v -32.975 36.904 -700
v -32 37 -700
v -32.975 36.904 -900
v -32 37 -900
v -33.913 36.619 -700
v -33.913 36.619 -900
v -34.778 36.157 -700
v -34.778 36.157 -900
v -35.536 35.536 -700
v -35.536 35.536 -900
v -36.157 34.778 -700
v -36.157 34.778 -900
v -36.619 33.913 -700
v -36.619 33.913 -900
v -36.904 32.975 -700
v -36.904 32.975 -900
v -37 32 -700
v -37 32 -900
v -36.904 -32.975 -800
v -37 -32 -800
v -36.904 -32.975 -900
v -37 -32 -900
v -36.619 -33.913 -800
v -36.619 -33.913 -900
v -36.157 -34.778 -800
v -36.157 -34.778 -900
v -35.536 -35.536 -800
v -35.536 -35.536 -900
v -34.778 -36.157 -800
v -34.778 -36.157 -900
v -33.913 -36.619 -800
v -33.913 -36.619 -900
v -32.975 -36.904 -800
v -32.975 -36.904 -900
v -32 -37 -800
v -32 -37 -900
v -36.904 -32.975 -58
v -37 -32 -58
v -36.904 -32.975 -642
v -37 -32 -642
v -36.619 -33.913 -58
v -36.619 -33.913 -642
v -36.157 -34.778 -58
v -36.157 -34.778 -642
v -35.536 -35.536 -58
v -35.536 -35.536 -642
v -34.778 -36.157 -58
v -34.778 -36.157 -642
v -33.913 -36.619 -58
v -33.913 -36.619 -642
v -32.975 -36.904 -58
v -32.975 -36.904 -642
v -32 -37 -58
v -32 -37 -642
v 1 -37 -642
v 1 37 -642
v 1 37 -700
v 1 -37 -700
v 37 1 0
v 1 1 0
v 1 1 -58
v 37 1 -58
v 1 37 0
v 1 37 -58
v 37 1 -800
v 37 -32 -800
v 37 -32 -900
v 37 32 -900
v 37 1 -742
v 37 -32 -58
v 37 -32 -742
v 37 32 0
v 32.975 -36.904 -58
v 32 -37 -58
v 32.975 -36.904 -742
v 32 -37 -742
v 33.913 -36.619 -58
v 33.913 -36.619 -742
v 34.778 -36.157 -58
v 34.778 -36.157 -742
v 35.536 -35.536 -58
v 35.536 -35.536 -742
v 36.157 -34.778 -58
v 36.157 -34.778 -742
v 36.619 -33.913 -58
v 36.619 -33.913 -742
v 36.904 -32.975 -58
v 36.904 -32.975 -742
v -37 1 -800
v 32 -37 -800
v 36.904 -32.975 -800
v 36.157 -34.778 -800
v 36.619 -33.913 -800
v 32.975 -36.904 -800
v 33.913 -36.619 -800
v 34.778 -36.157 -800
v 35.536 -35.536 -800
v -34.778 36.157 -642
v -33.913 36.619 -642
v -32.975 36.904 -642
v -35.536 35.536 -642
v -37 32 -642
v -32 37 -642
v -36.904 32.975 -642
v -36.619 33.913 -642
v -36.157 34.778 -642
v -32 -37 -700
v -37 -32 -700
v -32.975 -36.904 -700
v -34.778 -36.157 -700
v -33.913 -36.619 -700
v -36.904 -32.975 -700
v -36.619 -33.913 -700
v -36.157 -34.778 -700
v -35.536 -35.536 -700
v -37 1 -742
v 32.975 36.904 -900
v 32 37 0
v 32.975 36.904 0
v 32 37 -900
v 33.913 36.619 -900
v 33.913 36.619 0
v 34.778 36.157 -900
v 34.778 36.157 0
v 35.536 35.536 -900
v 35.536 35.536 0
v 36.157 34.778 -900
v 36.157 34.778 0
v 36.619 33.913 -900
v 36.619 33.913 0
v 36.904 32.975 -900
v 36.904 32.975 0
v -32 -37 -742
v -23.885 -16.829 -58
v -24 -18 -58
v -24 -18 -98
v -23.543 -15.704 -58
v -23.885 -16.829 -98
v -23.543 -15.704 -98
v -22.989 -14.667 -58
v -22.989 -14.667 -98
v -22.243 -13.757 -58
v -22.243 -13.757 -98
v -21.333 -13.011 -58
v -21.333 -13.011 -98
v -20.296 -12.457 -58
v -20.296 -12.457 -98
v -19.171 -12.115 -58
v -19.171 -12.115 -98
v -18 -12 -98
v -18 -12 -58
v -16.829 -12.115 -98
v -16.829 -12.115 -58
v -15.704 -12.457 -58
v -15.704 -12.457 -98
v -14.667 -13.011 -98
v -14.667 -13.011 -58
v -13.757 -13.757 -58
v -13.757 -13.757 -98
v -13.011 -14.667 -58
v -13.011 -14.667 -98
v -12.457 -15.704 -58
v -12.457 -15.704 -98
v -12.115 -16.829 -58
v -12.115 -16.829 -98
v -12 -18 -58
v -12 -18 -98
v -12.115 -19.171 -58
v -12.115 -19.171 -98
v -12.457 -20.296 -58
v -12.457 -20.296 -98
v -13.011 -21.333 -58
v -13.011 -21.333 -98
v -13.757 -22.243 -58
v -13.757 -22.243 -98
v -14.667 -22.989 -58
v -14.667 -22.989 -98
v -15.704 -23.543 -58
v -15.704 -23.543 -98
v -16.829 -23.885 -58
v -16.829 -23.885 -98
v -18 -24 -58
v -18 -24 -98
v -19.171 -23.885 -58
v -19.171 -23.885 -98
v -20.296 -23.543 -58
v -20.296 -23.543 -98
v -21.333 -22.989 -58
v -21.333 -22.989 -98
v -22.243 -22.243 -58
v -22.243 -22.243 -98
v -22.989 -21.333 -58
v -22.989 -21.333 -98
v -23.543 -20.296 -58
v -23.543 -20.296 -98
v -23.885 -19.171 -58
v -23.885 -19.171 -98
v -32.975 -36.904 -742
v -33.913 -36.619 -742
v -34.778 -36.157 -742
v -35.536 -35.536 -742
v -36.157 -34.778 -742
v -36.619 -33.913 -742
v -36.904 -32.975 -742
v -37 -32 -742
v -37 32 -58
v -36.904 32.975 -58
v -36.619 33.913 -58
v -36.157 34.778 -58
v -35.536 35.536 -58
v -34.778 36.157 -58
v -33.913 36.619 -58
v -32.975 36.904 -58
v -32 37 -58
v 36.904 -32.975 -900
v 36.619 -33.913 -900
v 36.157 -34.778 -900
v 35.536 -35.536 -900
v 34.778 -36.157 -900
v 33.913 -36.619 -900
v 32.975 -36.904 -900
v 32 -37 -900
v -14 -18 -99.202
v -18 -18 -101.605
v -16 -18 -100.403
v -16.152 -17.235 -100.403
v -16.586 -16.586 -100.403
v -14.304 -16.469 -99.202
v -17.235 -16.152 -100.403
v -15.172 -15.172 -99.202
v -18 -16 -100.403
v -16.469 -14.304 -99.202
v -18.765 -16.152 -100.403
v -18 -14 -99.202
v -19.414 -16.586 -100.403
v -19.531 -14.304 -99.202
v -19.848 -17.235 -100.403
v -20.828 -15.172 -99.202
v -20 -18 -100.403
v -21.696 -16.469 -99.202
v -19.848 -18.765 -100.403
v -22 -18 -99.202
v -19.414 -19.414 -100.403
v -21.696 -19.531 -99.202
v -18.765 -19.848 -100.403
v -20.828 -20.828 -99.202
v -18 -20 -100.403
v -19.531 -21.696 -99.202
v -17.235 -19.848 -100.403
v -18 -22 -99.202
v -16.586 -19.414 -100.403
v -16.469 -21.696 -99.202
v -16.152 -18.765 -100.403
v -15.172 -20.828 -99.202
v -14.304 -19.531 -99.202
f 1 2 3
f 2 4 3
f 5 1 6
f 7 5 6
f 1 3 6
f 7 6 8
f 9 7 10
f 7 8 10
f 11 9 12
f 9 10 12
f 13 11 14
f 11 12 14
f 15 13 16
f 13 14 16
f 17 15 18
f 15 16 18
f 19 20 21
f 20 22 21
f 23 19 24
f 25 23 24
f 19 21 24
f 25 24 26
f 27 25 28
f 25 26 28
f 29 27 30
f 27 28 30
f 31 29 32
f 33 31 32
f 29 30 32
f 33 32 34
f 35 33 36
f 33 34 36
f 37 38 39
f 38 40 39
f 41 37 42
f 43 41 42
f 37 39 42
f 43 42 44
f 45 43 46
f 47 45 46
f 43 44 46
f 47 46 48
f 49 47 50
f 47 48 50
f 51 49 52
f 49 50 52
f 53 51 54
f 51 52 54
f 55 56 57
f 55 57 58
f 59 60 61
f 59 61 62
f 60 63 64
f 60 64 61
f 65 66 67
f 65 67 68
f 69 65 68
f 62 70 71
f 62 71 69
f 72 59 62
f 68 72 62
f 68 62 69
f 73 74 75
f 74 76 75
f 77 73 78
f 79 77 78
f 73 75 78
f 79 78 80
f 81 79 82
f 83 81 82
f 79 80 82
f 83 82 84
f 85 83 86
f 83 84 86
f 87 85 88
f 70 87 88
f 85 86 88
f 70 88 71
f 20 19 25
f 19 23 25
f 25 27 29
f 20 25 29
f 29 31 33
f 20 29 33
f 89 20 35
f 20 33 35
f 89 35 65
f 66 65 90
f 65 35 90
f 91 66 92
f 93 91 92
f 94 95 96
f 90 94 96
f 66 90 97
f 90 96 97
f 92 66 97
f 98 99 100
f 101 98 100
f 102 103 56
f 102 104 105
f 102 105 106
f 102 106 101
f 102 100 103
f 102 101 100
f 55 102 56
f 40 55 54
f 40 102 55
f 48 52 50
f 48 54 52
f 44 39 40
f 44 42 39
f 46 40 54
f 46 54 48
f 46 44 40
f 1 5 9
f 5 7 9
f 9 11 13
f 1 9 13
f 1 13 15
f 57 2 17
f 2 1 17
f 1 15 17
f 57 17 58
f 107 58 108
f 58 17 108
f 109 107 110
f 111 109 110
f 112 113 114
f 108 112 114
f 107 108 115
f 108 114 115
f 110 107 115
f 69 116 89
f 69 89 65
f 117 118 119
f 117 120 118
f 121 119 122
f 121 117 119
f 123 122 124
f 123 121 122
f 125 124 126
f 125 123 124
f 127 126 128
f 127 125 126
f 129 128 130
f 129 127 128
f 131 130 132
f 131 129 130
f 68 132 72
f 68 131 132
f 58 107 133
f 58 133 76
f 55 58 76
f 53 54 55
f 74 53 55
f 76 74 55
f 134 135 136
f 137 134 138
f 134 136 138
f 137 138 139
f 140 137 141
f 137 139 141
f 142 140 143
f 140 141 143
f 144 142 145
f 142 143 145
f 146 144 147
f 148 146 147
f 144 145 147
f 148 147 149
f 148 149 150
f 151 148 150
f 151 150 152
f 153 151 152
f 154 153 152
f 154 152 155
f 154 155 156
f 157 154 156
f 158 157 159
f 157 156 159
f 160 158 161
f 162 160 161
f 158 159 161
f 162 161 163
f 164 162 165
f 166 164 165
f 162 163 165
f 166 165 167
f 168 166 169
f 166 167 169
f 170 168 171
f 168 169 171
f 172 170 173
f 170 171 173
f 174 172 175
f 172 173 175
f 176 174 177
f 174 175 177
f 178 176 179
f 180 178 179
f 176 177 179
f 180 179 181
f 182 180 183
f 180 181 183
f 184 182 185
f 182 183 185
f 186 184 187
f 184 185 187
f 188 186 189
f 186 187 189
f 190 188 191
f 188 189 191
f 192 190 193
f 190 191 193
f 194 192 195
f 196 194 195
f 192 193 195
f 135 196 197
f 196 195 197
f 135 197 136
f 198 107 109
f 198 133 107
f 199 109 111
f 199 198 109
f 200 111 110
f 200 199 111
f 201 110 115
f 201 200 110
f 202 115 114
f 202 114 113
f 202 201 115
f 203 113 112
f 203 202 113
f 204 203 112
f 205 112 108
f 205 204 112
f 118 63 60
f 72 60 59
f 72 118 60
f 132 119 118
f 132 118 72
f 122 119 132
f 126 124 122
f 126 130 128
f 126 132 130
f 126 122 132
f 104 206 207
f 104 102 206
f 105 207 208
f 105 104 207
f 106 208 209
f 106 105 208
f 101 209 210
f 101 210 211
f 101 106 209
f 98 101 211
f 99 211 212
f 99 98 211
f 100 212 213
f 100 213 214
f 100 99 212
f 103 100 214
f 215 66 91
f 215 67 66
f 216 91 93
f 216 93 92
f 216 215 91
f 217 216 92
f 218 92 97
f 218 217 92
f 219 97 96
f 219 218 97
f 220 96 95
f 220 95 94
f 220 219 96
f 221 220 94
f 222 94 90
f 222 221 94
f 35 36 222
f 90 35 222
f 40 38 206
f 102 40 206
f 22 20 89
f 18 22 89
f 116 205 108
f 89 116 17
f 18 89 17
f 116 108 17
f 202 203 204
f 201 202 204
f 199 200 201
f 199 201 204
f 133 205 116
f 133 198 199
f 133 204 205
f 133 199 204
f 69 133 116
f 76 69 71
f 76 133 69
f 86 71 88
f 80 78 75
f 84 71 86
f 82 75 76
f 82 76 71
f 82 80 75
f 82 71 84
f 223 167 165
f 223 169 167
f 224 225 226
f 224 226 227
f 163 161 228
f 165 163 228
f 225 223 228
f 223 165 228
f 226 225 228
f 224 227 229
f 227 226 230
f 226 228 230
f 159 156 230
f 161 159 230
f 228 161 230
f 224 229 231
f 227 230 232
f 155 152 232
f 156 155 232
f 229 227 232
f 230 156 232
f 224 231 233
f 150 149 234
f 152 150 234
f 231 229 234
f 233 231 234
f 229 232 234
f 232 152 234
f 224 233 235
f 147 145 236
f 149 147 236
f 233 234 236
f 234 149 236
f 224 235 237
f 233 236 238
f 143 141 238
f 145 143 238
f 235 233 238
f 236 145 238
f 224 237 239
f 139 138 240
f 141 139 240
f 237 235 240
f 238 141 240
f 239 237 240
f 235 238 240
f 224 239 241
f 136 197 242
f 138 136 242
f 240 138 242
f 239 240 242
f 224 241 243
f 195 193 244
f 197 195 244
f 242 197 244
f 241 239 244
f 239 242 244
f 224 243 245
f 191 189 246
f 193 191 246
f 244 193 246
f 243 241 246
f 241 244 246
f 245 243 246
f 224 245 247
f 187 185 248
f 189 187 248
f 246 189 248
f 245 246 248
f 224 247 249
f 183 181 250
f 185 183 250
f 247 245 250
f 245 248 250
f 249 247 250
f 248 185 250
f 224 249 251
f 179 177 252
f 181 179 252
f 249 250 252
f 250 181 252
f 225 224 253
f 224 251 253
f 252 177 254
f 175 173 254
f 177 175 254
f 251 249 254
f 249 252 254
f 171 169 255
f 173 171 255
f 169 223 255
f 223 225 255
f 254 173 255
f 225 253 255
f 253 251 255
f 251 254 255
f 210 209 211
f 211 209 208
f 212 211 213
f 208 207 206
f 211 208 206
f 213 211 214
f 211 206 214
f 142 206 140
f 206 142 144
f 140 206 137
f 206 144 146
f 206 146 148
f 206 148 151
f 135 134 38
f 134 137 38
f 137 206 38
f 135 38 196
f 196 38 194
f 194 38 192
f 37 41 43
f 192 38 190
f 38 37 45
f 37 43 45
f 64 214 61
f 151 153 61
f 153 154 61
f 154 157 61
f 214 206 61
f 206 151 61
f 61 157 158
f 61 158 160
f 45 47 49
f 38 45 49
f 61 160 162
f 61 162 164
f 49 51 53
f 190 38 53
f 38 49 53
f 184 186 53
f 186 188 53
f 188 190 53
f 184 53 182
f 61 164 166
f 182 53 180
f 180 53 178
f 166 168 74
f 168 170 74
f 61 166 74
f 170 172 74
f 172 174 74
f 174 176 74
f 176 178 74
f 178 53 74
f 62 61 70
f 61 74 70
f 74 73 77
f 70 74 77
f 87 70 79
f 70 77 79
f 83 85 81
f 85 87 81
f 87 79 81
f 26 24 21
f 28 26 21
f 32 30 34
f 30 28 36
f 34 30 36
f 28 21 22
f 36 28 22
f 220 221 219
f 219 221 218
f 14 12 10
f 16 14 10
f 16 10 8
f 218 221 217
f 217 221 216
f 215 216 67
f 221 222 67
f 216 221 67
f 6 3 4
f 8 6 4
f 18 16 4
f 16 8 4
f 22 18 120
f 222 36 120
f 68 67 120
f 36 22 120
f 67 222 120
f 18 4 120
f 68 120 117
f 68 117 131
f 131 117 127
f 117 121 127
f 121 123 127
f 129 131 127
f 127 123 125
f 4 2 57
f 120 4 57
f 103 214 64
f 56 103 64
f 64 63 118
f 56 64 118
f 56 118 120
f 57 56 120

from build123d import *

# Parameters (mm, degrees)
F0_W      = 74
F0_H      = 74
F1_DEPTH  = 900
F2_W      = 74
F2_H      = 58
F4_DEPTH  = 38
F3_W      = 74
F3_H      = 58
F5_DEPTH  = 38
F7_D      = 12
F7_DEPTH  = 40
F7_TIP    = 3.6051637142
F8_W      = 74
F8_H      = 58
F9_DEPTH  = 38
F10_W     = 74
F10_H     = 58
F11_DEPTH = 38
F12_R     = 5


with BuildPart() as f1:
    # F0 (on Top) → F1 (new body)
    with BuildSketch(Plane.XY):
        Rectangle(F0_W, F0_H)
    extrude(amount=-F1_DEPTH)

    # F2 (on face) → F4 (cut)
    with BuildSketch(Plane.XZ.offset(37)):
        with Locations((0, -29)):
            Rectangle(F2_W, F2_H)
    extrude(amount=-F4_DEPTH, mode=Mode.SUBTRACT)

    # F3 (on face) → F5 (cut)
    with BuildSketch(Plane(origin=(-37, 0, 0), x_dir=(0, -1, 0), z_dir=(-1, 0, 0))):
        with Locations((0, -29)):
            Rectangle(F3_W, F3_H)
    extrude(amount=-F5_DEPTH, mode=Mode.SUBTRACT)

    # F7
    with Locations(Plane.XY.offset(-58)):
        with Locations((-18, -18)):
            Hole(F7_D / 2, depth=F7_DEPTH)
            with Locations((0, 0, -(F7_DEPTH + F7_TIP / 2))):  # 118° drill point
                Cone(0, F7_D / 2, F7_TIP, mode=Mode.SUBTRACT)

    # F8 (on face) → F9 (cut)
    with BuildSketch(Plane.XZ.offset(37)):
        with Locations((0, -771)):
            Rectangle(F8_W, F8_H)
    extrude(amount=-F9_DEPTH, mode=Mode.SUBTRACT)

    # F10 (on face) → F11 (cut)
    with BuildSketch(Plane(origin=(-37, 0, 0), x_dir=(0, -1, 0), z_dir=(-1, 0, 0))):
        with Locations((0, -671)):
            Rectangle(F10_W, F10_H)
    extrude(amount=-F11_DEPTH, mode=Mode.SUBTRACT)

    # F12
    f12_edges = [f1.edges().sort_by_distance(p)[0] for p in [
        (-37, -37, -850),
        (-37, -37, -721),
        (-37, -37, -350),
        (-37, 37, -350),
        (-37, 37, -800),
        (37, -37, -850),
        (37, -37, -400),
        (37, 37, -450),
    ]]
    fillet(f12_edges, radius=F12_R)


solid = f1.part
